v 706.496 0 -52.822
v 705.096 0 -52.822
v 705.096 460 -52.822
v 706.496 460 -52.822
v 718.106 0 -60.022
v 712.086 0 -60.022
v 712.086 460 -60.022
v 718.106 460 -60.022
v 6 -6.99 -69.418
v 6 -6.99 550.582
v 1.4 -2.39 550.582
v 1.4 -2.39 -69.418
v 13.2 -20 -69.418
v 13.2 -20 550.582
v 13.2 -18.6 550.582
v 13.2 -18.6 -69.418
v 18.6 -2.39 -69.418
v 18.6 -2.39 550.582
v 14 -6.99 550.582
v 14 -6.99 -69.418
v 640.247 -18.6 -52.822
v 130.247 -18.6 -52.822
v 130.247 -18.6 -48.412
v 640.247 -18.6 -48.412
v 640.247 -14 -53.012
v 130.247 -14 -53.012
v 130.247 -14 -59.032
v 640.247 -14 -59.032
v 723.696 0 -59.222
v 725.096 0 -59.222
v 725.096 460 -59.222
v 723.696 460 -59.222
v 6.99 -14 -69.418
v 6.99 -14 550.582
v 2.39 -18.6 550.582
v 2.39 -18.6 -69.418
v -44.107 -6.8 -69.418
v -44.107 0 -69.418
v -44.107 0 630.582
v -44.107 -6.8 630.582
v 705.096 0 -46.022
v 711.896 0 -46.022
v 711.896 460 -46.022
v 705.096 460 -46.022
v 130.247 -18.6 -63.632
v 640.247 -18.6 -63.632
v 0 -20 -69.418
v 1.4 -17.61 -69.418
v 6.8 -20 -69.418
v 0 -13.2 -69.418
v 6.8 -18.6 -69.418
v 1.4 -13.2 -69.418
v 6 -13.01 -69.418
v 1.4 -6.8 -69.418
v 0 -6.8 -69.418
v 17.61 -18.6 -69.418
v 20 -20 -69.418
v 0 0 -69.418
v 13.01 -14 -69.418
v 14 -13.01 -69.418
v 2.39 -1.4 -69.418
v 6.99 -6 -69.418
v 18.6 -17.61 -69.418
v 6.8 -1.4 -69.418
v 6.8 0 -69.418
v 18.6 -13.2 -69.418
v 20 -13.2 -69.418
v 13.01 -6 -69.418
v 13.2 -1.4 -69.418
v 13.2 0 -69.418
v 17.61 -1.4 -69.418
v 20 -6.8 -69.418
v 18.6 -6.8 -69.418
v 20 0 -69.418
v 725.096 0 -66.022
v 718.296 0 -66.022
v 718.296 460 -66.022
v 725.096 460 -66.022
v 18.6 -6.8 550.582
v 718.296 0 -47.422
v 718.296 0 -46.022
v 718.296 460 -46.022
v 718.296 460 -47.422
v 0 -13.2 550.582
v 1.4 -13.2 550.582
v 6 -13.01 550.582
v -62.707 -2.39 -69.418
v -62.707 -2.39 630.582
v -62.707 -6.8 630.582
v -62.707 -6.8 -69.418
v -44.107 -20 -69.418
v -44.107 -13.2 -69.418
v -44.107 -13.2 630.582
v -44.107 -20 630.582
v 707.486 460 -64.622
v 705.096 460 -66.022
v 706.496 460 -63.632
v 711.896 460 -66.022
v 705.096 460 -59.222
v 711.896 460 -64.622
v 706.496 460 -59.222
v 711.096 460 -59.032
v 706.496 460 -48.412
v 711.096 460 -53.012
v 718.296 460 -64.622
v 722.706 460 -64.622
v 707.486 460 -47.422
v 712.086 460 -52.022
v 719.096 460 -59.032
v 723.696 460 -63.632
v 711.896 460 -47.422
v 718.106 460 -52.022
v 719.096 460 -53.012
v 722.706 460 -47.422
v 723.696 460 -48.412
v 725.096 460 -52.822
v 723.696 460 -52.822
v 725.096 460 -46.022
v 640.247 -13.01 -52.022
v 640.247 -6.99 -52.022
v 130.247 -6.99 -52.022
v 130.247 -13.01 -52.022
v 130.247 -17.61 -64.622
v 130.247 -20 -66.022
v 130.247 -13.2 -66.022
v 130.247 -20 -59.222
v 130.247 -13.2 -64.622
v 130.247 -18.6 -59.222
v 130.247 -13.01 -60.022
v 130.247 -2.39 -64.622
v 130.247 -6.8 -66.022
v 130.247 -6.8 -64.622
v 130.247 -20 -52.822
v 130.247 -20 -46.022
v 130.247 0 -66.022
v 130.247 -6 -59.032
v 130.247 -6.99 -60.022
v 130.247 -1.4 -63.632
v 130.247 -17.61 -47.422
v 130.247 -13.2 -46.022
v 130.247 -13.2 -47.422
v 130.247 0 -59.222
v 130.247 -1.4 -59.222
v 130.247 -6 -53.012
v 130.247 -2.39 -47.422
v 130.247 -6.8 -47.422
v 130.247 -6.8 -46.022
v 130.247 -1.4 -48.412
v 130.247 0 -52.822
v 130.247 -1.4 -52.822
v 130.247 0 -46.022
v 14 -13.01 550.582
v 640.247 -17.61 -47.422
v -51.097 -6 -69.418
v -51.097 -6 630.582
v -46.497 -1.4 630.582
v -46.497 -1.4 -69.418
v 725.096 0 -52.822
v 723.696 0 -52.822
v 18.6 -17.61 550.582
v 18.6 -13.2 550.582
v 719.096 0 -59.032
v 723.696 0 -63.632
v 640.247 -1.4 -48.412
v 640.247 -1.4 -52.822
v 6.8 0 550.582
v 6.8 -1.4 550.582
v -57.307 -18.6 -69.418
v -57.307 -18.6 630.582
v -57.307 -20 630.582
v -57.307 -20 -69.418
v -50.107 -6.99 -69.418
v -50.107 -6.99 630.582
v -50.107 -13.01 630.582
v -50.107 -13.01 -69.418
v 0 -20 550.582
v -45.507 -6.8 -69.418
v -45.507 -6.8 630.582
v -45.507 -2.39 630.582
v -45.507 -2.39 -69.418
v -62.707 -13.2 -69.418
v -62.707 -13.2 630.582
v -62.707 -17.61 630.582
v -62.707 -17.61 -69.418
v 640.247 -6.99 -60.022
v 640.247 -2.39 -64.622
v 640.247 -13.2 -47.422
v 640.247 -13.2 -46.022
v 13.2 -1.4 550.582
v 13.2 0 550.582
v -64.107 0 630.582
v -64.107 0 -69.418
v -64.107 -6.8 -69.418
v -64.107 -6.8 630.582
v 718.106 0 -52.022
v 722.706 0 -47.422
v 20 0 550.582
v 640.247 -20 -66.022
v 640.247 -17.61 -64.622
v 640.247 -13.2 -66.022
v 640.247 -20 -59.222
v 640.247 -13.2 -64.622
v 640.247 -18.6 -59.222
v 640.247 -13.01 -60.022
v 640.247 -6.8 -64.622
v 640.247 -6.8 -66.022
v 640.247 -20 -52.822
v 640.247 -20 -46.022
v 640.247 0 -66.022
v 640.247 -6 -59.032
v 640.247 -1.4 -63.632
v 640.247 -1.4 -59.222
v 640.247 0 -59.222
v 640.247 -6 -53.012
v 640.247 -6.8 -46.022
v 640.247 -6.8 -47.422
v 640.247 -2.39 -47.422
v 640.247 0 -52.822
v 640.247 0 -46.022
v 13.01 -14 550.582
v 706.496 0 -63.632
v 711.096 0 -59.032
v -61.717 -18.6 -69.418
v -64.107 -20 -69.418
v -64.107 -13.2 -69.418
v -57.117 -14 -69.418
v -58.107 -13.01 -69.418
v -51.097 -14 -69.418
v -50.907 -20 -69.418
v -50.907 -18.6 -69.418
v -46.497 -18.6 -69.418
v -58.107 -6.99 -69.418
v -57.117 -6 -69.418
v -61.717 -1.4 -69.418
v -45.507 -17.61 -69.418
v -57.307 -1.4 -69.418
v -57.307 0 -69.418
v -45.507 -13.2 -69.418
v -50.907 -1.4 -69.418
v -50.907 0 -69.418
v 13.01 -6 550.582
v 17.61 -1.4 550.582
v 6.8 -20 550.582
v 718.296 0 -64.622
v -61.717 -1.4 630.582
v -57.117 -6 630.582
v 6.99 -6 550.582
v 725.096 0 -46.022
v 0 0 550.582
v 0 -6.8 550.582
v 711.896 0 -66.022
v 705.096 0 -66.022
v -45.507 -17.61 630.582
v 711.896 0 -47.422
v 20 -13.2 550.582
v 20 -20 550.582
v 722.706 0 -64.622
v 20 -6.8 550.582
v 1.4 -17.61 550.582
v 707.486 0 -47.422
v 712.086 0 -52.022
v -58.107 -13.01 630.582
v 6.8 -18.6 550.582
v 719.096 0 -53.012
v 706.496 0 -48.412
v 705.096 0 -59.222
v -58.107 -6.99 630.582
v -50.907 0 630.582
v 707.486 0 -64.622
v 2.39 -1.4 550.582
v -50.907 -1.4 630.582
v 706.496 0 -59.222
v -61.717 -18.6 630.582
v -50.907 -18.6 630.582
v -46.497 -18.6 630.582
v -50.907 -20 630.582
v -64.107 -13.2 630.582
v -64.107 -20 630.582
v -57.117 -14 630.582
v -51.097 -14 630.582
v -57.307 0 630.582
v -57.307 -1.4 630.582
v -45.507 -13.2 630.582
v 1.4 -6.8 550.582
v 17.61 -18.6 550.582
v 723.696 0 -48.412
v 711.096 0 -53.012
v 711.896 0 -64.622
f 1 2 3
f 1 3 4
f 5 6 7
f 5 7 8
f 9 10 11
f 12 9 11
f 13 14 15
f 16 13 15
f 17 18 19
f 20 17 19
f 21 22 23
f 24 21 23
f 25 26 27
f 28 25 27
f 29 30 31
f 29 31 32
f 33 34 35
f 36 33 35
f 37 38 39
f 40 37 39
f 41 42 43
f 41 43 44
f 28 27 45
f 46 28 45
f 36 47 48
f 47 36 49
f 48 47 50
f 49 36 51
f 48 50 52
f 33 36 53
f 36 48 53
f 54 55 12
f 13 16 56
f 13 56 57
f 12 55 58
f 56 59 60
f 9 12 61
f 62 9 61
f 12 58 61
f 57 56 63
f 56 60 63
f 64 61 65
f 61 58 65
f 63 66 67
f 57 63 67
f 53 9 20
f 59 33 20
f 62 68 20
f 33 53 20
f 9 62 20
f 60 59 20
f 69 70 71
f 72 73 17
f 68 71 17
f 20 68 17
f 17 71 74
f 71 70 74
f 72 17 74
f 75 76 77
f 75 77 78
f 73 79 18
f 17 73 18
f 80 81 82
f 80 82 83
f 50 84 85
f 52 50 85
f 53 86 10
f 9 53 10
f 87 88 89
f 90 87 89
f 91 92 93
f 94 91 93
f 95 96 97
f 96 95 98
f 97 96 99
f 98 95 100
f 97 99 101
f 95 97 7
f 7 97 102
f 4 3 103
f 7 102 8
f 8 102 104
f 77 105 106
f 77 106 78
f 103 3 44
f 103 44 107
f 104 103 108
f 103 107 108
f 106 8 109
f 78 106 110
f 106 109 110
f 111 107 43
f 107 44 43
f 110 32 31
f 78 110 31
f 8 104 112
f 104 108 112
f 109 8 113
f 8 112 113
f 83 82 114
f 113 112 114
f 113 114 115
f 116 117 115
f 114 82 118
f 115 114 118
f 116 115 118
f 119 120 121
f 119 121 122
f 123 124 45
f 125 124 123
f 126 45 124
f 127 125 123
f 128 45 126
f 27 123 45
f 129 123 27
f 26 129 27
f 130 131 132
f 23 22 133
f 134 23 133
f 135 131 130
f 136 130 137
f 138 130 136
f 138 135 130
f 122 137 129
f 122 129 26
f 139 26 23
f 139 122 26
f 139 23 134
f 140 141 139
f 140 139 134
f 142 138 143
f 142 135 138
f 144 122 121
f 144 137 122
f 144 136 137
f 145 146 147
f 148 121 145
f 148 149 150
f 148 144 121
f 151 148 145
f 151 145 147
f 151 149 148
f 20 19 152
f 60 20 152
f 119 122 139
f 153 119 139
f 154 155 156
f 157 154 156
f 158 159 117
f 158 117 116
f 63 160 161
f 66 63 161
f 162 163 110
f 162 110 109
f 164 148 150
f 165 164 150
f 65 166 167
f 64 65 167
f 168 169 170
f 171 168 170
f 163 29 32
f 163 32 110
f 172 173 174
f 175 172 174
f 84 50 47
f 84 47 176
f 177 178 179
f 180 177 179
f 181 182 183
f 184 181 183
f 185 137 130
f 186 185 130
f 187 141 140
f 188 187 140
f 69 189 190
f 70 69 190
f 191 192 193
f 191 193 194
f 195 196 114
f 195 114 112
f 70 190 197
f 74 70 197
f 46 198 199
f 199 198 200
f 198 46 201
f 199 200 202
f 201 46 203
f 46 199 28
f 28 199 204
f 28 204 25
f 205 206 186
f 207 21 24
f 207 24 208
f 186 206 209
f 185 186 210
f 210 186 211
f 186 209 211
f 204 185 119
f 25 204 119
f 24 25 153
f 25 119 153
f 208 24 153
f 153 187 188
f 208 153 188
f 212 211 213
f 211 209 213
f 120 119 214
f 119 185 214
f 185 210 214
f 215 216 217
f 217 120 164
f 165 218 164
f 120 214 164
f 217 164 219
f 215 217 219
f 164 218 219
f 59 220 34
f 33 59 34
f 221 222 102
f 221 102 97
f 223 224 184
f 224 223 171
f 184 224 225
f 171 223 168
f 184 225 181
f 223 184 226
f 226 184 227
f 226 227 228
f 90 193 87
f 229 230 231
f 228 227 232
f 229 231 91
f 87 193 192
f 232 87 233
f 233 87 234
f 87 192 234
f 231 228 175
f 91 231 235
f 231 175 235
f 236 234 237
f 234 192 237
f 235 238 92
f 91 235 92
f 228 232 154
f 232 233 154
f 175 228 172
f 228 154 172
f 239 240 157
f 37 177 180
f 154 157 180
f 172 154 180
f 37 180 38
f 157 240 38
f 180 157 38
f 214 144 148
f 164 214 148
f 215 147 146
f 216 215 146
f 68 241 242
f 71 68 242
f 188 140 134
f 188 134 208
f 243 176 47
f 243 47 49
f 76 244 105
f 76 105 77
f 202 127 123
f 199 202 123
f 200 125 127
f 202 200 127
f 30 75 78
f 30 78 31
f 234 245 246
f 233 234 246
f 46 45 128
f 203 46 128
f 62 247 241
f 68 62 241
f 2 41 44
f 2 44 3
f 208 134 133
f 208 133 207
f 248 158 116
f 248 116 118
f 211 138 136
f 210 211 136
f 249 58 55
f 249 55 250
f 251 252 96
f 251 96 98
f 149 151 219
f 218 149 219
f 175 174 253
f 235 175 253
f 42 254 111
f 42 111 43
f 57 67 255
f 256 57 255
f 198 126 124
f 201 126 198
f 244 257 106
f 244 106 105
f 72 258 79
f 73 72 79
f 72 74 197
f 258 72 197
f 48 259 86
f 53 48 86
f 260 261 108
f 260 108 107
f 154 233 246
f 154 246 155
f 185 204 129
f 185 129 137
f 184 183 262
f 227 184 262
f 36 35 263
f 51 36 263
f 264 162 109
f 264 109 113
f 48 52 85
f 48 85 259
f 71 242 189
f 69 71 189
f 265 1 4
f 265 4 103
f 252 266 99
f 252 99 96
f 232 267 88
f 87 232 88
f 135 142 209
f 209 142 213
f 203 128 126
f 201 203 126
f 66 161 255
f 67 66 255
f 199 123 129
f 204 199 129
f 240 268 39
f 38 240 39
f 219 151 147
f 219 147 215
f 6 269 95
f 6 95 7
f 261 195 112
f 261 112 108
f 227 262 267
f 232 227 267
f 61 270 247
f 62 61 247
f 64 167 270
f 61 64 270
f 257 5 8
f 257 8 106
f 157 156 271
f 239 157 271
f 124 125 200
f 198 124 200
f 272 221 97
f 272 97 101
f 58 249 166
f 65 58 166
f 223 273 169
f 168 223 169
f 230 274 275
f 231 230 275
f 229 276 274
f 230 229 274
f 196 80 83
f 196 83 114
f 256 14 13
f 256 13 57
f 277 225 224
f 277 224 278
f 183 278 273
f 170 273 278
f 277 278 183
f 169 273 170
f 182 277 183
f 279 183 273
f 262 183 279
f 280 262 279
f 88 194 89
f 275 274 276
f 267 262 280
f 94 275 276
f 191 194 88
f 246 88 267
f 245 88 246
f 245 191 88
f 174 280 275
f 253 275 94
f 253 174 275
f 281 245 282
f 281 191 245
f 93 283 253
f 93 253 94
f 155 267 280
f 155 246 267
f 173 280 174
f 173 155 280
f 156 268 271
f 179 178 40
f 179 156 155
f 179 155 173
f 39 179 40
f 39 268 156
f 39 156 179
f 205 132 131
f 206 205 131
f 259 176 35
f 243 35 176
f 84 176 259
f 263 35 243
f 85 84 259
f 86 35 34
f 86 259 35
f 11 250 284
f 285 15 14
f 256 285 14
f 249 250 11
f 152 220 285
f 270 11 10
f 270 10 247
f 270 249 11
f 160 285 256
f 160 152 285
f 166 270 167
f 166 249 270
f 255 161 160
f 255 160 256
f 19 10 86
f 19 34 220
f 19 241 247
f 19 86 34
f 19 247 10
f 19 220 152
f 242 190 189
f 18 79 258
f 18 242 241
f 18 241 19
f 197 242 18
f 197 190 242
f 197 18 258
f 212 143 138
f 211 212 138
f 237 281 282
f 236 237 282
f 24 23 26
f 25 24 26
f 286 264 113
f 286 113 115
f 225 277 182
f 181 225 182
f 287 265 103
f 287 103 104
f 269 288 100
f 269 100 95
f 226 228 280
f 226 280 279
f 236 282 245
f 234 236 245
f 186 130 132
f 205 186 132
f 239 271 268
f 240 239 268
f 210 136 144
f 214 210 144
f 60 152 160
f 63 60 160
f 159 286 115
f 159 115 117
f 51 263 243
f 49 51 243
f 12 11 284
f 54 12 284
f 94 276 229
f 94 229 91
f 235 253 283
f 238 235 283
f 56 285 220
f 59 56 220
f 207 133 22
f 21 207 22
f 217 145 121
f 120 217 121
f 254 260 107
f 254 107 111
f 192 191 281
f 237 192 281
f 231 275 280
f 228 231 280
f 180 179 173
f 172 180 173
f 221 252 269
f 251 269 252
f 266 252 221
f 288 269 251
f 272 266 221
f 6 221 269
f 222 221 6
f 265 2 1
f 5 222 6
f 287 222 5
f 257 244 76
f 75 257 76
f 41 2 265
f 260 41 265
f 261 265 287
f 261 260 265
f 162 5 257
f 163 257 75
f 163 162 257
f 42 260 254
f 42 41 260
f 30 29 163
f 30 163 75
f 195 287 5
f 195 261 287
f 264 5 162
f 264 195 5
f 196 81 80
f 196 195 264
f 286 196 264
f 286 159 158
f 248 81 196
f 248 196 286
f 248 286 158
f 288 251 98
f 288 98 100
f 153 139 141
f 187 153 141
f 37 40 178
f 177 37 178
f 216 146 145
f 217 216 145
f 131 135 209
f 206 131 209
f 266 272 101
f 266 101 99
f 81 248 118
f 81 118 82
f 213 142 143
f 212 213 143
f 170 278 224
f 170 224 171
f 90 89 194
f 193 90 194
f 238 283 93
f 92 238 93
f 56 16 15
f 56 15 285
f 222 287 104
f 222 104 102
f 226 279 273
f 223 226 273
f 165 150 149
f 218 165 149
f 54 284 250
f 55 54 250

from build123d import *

# Parameters (mm, degrees)
F0_W     = 20
F0_H     = 700
F1_DEPTH = 20
F0_W_2   = 510
F0_H_2   = 20
F0_H_3   = 620
F2_DEPTH = 460
F4_DEPTH = 620
F6_DEPTH = 700
F8_DEPTH = 510


# Not quite as in the source:
# - a feature names something its author has since deleted; it is built from what else it names


with BuildPart() as f1:
    # F0 (on Front) → F1 (new body)
    with BuildSketch(Plane.XZ):
        with Locations((-54.1069640219, 280.5815398693)):
            Rectangle(F0_W, F0_H)
    extrude(amount=F1_DEPTH)

    # F5 (on face) → F6 (cut, through all)
    with BuildSketch(Plane.XY.offset(630.5815398693)):
        Polygon((-62.7069640219, -6.8), (-64.1069640219, -6.8), (-64.1069640219, -13.2), (-62.7069640219, -13.2), (-62.7069640219, -17.6100505063), (-58.1069640219, -13.0100505063), (-58.1069640219, -10), (-58.1069640219, -6.9899494937), (-62.7069640219, -2.3899494937), align=None)
        Polygon((-50.9069640219, 0), (-57.3069640219, 0), (-57.3069640219, -1.4), (-61.7170145283, -1.4), (-57.1170145283, -6), (-54.1069640219, -6), (-51.0969135156, -6), (-46.4969135156, -1.4), (-50.9069640219, -1.4), align=None)
        Polygon((-44.1069640219, -13.2), (-44.1069640219, -6.8), (-45.5069640219, -6.8), (-45.5069640219, -2.3899494937), (-50.1069640219, -6.9899494937), (-50.1069640219, -10), (-50.1069640219, -13.0100505063), (-45.5069640219, -17.6100505063), (-45.5069640219, -13.2), align=None)
        Polygon((-57.3069640219, -18.6), (-57.3069640219, -20), (-50.9069640219, -20), (-50.9069640219, -18.6), (-46.4969135156, -18.6), (-51.0969135156, -14), (-54.1069640219, -14), (-57.1170145283, -14), (-61.7170145283, -18.6), align=None)
    extrude(amount=-F6_DEPTH, mode=Mode.SUBTRACT)


with BuildPart() as f1b:
    # F0 (on Front) → F1, piece 2 (new body)
    with BuildSketch(Plane.XZ):
        with Locations((385.2474099398, -56.0215914249)):
            Rectangle(F0_W_2, F0_H_2)
    extrude(amount=F1_DEPTH)

    # F7 (on face) → F8 (cut, through all)
    with BuildSketch(Plane(origin=(130.2474099398, 0, 0), x_dir=(0, -1, 0), z_dir=(-1, 0, 0))):
        Polygon((13.2, -46.0215914249), (6.8, -46.0215914249), (6.8, -47.4215914249), (2.3899494937, -47.4215914249), (6.9899494937, -52.0215914249), (10, -52.0215914249), (13.0100505063, -52.0215914249), (17.6100505063, -47.4215914249), (13.2, -47.4215914249), align=None)
        Polygon((20, -59.2215914249), (20, -52.8215914249), (18.6, -52.8215914249), (18.6, -48.4115409186), (14, -53.0115409186), (14, -56.0215914249), (14, -59.0316419313), (18.6, -63.6316419313), (18.6, -59.2215914249), align=None)
        Polygon((6.8, -64.6215914249), (6.8, -66.0215914249), (13.2, -66.0215914249), (13.2, -64.6215914249), (17.6100505063, -64.6215914249), (13.0100505063, -60.0215914249), (10, -60.0215914249), (6.9899494937, -60.0215914249), (2.3899494937, -64.6215914249), align=None)
        Polygon((1.4, -52.8215914249), (0, -52.8215914249), (0, -59.2215914249), (1.4, -59.2215914249), (1.4, -63.6316419313), (6, -59.0316419313), (6, -56.0215914249), (6, -53.0115409186), (1.4, -48.4115409186), align=None)
    extrude(amount=-F8_DEPTH, mode=Mode.SUBTRACT)


with BuildPart() as f1c:
    # F0 (on Front) → F1, piece 3 (new body)
    with BuildSketch(Plane.XZ):
        with Locations((10, 240.5815398693)):
            Rectangle(F0_W, F0_H_3)
    extrude(amount=F1_DEPTH)

    # F3 (on face) → F4 (cut, through all)
    with BuildSketch(Plane.XY.offset(550.5815398693)):
        Polygon((13.2, 0), (6.8, 0), (6.8, -1.4), (2.3899494937, -1.4), (6.9899494937, -6), (10, -6), (13.0100505063, -6), (17.6100505063, -1.4), (13.2, -1.4), align=None)
        Polygon((20, -13.2), (20, -6.8), (18.6, -6.8), (18.6, -2.3899494937), (14, -6.9899494937), (14, -10), (14, -13.0100505063), (18.6, -17.6100505063), (18.6, -13.2), align=None)
        Polygon((6.8, -18.6), (6.8, -20), (13.2, -20), (13.2, -18.6), (17.6100505063, -18.6), (13.0100505063, -14), (10, -14), (6.9899494937, -14), (2.3899494937, -18.6), align=None)
        Polygon((1.4, -6.8), (0, -6.8), (0, -13.2), (1.4, -13.2), (1.4, -17.6100505063), (6, -13.0100505063), (6, -10), (6, -6.9899494937), (1.4, -2.3899494937), align=None)
    extrude(amount=-F4_DEPTH, mode=Mode.SUBTRACT)


with BuildPart() as f2:
    # F0 (on Front) → F2 (new body)
    with BuildSketch(Plane.XZ):
        Polygon((705.0956487656, -59.2215914249), (705.0956487656, -66.0215914249), (711.8956487656, -66.0215914249), (711.8956487656, -64.6215914249), (707.4855982592, -64.6215914249), (712.0855982592, -60.0215914249), (715.0956487656, -60.0215914249), (718.1056992719, -60.0215914249), (722.7056992719, -64.6215914249), (718.2956487656, -64.6215914249), (718.2956487656, -66.0215914249), (725.0956487656, -66.0215914249), (725.0956487656, -59.2215914249), (723.6956487656, -59.2215914249), (723.6956487656, -63.6316419313), (719.0956487656, -59.0316419313), (719.0956487656, -56.0215914249), (719.0956487656, -53.0115409186), (723.6956487656, -48.4115409186), (723.6956487656, -52.8215914249), (725.0956487656, -52.8215914249), (725.0956487656, -46.0215914249), (718.2956487656, -46.0215914249), (718.2956487656, -47.4215914249), (722.7056992719, -47.4215914249), (718.1056992719, -52.0215914249), (715.0956487656, -52.0215914249), (712.0855982592, -52.0215914249), (707.4855982592, -47.4215914249), (711.8956487656, -47.4215914249), (711.8956487656, -46.0215914249), (705.0956487656, -46.0215914249), (705.0956487656, -52.8215914249), (706.4956487656, -52.8215914249), (706.4956487656, -48.4115409186), (711.0956487656, -53.0115409186), (711.0956487656, -56.0215914249), (711.0956487656, -59.0316419313), (706.4956487656, -63.6316419313), (706.4956487656, -59.2215914249), align=None)
    extrude(amount=-F2_DEPTH)


solid = Compound([f1.part, f1b.part, f1c.part, f2.part])
